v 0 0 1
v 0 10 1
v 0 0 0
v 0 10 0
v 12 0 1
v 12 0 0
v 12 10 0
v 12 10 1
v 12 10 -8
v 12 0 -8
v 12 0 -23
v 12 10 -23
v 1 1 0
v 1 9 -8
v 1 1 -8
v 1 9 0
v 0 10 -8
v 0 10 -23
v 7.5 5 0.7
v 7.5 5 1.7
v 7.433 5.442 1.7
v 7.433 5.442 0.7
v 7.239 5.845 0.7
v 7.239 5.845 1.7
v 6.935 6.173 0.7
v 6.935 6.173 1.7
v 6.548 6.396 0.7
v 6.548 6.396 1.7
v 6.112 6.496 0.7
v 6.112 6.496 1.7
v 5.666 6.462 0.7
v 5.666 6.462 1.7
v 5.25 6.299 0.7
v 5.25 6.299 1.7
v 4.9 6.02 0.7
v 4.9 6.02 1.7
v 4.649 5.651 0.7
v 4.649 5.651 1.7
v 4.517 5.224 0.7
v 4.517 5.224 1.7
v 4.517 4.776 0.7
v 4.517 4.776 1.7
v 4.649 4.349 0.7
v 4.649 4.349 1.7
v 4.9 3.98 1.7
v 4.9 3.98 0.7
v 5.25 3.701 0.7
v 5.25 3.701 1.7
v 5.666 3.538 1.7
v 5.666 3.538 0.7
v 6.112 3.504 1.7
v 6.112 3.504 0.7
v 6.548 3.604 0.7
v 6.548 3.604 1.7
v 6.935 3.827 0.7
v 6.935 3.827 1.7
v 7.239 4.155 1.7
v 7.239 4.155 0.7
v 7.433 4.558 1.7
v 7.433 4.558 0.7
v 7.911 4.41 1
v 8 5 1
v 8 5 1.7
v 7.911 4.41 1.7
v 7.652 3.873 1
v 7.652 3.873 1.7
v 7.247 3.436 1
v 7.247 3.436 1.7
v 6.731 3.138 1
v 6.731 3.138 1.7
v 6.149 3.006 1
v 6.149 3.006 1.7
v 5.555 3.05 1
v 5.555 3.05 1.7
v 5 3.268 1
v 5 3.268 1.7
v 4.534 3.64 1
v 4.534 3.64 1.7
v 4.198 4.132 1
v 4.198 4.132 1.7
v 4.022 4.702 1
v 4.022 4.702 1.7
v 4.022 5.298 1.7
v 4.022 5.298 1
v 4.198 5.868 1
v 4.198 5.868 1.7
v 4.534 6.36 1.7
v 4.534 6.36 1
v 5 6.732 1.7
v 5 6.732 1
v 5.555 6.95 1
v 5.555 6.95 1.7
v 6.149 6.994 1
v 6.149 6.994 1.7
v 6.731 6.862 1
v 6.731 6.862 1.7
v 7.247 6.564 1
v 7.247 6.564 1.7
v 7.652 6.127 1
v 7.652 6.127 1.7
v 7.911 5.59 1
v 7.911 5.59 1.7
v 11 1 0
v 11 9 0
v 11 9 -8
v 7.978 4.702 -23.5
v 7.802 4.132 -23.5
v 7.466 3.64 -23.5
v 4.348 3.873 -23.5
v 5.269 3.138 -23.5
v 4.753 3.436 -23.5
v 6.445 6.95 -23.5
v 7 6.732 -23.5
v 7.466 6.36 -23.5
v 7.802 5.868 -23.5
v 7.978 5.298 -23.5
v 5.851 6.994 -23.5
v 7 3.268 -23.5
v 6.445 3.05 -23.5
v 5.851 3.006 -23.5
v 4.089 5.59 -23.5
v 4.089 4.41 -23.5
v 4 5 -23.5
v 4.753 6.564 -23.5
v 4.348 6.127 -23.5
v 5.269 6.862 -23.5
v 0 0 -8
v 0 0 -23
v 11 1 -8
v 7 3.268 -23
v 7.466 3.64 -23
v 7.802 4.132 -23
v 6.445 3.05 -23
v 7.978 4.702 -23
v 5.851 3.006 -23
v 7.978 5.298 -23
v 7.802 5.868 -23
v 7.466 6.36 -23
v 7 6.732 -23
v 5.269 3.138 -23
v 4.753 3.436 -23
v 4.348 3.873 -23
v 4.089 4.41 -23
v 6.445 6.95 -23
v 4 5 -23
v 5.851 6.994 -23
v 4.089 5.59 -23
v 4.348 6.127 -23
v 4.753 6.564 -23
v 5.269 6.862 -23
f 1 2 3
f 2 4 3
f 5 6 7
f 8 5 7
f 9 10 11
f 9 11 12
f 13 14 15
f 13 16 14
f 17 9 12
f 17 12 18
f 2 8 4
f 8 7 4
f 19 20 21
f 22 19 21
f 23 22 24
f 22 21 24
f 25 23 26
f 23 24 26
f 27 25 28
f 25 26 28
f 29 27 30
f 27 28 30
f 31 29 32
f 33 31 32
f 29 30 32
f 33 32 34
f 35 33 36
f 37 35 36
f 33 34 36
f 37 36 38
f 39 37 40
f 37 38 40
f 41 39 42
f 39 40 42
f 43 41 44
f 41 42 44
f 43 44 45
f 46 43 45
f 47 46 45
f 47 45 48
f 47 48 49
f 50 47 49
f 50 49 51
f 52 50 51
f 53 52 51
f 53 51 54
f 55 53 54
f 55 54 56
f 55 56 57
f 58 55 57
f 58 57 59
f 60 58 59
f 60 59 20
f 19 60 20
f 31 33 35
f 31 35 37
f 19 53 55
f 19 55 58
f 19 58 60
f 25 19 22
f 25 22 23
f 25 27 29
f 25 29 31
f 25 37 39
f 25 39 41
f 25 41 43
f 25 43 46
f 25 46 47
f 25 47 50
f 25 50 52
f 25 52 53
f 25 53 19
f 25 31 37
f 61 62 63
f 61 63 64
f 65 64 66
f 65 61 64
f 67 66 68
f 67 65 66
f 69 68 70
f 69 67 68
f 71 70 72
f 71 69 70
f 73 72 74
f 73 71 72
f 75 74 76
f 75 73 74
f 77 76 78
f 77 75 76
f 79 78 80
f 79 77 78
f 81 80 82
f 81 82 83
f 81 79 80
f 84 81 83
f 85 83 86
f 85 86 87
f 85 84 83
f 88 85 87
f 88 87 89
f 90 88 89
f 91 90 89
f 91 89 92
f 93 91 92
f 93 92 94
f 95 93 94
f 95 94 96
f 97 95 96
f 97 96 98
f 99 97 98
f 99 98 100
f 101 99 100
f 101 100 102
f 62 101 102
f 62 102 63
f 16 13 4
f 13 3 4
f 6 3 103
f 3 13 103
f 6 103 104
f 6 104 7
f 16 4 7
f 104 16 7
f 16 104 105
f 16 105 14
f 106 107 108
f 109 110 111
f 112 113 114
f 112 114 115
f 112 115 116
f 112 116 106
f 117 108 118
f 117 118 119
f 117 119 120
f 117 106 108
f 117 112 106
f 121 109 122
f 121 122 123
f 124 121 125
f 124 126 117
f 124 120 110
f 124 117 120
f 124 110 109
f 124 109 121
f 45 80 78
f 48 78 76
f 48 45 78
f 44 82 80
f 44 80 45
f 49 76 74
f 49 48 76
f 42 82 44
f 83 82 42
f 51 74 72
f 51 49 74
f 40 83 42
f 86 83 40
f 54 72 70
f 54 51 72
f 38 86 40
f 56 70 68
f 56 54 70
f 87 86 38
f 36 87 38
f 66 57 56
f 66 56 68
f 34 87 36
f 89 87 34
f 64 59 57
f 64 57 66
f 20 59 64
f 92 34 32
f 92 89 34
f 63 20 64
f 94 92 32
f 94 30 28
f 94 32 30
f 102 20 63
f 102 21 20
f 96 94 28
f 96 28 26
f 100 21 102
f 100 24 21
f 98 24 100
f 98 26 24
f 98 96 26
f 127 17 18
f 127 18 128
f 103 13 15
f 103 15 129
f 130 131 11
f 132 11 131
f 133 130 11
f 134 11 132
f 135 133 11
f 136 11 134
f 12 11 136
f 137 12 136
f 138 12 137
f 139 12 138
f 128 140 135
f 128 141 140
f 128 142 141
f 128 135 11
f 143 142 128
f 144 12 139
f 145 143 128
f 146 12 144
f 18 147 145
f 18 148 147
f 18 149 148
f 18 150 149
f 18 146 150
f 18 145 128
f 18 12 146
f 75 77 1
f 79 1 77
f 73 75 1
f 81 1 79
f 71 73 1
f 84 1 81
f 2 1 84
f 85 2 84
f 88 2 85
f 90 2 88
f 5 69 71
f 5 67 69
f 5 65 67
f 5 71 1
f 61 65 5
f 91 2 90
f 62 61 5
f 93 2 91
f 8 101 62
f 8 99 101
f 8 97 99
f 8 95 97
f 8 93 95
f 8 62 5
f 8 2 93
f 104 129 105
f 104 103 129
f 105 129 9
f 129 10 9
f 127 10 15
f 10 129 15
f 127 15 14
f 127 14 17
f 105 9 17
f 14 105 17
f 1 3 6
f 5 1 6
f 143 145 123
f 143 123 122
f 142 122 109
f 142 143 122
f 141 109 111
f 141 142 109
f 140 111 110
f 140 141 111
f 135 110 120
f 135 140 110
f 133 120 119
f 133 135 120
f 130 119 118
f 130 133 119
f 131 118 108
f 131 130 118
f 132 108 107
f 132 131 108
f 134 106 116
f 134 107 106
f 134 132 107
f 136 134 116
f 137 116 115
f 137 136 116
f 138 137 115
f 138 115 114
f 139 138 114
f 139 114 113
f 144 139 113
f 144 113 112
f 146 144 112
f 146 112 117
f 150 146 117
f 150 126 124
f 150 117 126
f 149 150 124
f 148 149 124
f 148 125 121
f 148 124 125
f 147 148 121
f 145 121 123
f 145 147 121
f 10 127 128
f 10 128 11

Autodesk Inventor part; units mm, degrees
ref_plane "YZ Plane" through (0, 0, 0) normal (1, 0, 0) x (0, 1, 0)
ref_plane "XZ Plane" through (0, 0, 0) normal (0, 1, 0) x (-1, 0, 0)
ref_plane "XY Plane" through (0, 0, 0) normal (0, 0, 1) x (1, 0, 0)
sketch "Эскиз2" plane through (0, 0, 0) normal (0, 0, 1) x (1, 0, 0)
  line L0 (0, 0) -> (12, 0)
  line L1 (12, 0) -> (12, 10)
  line L2 (12, 10) -> (0, 10)
  line L3 (0, 10) -> (0, 0)
  line L4 (-15.2128, 15.4518) -> (-15.9082, 15.4518)
  line L5 (-15.9082, 15.4518) -> (-15.9082, 15.4083)
  line L6 (-15.9082, 15.4083) -> (-15.2128, 15.4083)
  line L7 (-15.2128, 15.4083) -> (-15.2128, 15.4518)
  dimension "d0" = 12
  dimension "d1" = 10
extrude "Выдавливание1" add sketch "Эскиз2" along normal blind 1 contours L3 L2 L1 L0
sketch "Эскиз3" plane through (0, 0, 1) normal (0, 0, 1) x (1, 0, 0)
  line L0 (0, 10) -> (0, 0) projected
  line L1 (0, 5) -> (12, 5)
  line L2 (12, 0) -> (12, 10) projected
  circle A0 centre (6, 5) radius 2
  dimension "d4" = 4
extrude "Выдавливание2" add sketch "Эскиз3" along normal blind 0.7
sketch "Эскиз5" plane through (0, 0, 0) normal (0, 0, -1) x (-1, 0, 0)
  line L0 (-12, 10) -> (0, 10) projected
  line L1 (0, 10) -> (0, 0) projected
  line L2 (-12, 10) -> (0, 10)
  line L3 (0, 10) -> (0, 0)
  line L4 (0, 0) -> (-12, 0)
  line L5 (-12, 0) -> (-12, 10)
  line L6 (-12, 10) -> (-11, 10)
  line L7 (-11, 10) -> (-11, 9)
  line L8 (-11, 9) -> (-1, 9)
  line L9 (-1, 9) -> (-1, 1)
  line L10 (-1, 1) -> (-11, 1)
  line L11 (-11, 1) -> (-11, 9)
  dimension "d22" = 1
  dimension "d23" = 1
  dimension "d24" = 10
  dimension "d25" = 8
  dimension "d26" = 12
  dimension "d27" = 10
extrude "Выдавливание4" add sketch "Эскиз5" along normal blind 8 contours L8 L9 L10 L11
sketch "Эскиз6" plane through (0, 0, -8) normal (0, 0, -1) x (-1, 0, 0)
  line L0 (-12, 10) -> (0, 10) projected
  line L1 (0, 10) -> (0, 0) projected
  line L2 (-12, 10) -> (0, 10)
  line L3 (0, 10) -> (0, 0)
  line L4 (0, 0) -> (-12, 0)
  line L5 (-12, 0) -> (-12, 10)
extrude "Выдавливание5" add sketch "Эскиз6" along normal blind 15
sketch "Эскиз11" plane through (6, 5, 1.7) normal (0, 0, 1) x (1, 0, 0)
  circle A0 centre (0, 0) radius 1.5
  point P0 (-6, -5)
  dimension "d32" = 3
extrude "Выдавливание9" cut sketch "Эскиз11" against normal blind 1
sketch "Эскиз8" plane through (0, 0, -23) normal (0, 0, -1) x (-1, 0, 0)
  circle A0 centre (-6, 5) radius 2 projected
  circle A1 centre (-6, 5) radius 2.5
  point P0 (0, 0)
  dimension "d15" = 5
extrude "Выдавливание6" add sketch "Эскиз8" along normal blind 0.5 contours A0
equation "\"d22\" = -0.5 * d24 + 0.5 * d26"
equation "\"d23\" = -0.5 * d25 + 0.5 * d27"
properties part number "Micro Gearmotors"
